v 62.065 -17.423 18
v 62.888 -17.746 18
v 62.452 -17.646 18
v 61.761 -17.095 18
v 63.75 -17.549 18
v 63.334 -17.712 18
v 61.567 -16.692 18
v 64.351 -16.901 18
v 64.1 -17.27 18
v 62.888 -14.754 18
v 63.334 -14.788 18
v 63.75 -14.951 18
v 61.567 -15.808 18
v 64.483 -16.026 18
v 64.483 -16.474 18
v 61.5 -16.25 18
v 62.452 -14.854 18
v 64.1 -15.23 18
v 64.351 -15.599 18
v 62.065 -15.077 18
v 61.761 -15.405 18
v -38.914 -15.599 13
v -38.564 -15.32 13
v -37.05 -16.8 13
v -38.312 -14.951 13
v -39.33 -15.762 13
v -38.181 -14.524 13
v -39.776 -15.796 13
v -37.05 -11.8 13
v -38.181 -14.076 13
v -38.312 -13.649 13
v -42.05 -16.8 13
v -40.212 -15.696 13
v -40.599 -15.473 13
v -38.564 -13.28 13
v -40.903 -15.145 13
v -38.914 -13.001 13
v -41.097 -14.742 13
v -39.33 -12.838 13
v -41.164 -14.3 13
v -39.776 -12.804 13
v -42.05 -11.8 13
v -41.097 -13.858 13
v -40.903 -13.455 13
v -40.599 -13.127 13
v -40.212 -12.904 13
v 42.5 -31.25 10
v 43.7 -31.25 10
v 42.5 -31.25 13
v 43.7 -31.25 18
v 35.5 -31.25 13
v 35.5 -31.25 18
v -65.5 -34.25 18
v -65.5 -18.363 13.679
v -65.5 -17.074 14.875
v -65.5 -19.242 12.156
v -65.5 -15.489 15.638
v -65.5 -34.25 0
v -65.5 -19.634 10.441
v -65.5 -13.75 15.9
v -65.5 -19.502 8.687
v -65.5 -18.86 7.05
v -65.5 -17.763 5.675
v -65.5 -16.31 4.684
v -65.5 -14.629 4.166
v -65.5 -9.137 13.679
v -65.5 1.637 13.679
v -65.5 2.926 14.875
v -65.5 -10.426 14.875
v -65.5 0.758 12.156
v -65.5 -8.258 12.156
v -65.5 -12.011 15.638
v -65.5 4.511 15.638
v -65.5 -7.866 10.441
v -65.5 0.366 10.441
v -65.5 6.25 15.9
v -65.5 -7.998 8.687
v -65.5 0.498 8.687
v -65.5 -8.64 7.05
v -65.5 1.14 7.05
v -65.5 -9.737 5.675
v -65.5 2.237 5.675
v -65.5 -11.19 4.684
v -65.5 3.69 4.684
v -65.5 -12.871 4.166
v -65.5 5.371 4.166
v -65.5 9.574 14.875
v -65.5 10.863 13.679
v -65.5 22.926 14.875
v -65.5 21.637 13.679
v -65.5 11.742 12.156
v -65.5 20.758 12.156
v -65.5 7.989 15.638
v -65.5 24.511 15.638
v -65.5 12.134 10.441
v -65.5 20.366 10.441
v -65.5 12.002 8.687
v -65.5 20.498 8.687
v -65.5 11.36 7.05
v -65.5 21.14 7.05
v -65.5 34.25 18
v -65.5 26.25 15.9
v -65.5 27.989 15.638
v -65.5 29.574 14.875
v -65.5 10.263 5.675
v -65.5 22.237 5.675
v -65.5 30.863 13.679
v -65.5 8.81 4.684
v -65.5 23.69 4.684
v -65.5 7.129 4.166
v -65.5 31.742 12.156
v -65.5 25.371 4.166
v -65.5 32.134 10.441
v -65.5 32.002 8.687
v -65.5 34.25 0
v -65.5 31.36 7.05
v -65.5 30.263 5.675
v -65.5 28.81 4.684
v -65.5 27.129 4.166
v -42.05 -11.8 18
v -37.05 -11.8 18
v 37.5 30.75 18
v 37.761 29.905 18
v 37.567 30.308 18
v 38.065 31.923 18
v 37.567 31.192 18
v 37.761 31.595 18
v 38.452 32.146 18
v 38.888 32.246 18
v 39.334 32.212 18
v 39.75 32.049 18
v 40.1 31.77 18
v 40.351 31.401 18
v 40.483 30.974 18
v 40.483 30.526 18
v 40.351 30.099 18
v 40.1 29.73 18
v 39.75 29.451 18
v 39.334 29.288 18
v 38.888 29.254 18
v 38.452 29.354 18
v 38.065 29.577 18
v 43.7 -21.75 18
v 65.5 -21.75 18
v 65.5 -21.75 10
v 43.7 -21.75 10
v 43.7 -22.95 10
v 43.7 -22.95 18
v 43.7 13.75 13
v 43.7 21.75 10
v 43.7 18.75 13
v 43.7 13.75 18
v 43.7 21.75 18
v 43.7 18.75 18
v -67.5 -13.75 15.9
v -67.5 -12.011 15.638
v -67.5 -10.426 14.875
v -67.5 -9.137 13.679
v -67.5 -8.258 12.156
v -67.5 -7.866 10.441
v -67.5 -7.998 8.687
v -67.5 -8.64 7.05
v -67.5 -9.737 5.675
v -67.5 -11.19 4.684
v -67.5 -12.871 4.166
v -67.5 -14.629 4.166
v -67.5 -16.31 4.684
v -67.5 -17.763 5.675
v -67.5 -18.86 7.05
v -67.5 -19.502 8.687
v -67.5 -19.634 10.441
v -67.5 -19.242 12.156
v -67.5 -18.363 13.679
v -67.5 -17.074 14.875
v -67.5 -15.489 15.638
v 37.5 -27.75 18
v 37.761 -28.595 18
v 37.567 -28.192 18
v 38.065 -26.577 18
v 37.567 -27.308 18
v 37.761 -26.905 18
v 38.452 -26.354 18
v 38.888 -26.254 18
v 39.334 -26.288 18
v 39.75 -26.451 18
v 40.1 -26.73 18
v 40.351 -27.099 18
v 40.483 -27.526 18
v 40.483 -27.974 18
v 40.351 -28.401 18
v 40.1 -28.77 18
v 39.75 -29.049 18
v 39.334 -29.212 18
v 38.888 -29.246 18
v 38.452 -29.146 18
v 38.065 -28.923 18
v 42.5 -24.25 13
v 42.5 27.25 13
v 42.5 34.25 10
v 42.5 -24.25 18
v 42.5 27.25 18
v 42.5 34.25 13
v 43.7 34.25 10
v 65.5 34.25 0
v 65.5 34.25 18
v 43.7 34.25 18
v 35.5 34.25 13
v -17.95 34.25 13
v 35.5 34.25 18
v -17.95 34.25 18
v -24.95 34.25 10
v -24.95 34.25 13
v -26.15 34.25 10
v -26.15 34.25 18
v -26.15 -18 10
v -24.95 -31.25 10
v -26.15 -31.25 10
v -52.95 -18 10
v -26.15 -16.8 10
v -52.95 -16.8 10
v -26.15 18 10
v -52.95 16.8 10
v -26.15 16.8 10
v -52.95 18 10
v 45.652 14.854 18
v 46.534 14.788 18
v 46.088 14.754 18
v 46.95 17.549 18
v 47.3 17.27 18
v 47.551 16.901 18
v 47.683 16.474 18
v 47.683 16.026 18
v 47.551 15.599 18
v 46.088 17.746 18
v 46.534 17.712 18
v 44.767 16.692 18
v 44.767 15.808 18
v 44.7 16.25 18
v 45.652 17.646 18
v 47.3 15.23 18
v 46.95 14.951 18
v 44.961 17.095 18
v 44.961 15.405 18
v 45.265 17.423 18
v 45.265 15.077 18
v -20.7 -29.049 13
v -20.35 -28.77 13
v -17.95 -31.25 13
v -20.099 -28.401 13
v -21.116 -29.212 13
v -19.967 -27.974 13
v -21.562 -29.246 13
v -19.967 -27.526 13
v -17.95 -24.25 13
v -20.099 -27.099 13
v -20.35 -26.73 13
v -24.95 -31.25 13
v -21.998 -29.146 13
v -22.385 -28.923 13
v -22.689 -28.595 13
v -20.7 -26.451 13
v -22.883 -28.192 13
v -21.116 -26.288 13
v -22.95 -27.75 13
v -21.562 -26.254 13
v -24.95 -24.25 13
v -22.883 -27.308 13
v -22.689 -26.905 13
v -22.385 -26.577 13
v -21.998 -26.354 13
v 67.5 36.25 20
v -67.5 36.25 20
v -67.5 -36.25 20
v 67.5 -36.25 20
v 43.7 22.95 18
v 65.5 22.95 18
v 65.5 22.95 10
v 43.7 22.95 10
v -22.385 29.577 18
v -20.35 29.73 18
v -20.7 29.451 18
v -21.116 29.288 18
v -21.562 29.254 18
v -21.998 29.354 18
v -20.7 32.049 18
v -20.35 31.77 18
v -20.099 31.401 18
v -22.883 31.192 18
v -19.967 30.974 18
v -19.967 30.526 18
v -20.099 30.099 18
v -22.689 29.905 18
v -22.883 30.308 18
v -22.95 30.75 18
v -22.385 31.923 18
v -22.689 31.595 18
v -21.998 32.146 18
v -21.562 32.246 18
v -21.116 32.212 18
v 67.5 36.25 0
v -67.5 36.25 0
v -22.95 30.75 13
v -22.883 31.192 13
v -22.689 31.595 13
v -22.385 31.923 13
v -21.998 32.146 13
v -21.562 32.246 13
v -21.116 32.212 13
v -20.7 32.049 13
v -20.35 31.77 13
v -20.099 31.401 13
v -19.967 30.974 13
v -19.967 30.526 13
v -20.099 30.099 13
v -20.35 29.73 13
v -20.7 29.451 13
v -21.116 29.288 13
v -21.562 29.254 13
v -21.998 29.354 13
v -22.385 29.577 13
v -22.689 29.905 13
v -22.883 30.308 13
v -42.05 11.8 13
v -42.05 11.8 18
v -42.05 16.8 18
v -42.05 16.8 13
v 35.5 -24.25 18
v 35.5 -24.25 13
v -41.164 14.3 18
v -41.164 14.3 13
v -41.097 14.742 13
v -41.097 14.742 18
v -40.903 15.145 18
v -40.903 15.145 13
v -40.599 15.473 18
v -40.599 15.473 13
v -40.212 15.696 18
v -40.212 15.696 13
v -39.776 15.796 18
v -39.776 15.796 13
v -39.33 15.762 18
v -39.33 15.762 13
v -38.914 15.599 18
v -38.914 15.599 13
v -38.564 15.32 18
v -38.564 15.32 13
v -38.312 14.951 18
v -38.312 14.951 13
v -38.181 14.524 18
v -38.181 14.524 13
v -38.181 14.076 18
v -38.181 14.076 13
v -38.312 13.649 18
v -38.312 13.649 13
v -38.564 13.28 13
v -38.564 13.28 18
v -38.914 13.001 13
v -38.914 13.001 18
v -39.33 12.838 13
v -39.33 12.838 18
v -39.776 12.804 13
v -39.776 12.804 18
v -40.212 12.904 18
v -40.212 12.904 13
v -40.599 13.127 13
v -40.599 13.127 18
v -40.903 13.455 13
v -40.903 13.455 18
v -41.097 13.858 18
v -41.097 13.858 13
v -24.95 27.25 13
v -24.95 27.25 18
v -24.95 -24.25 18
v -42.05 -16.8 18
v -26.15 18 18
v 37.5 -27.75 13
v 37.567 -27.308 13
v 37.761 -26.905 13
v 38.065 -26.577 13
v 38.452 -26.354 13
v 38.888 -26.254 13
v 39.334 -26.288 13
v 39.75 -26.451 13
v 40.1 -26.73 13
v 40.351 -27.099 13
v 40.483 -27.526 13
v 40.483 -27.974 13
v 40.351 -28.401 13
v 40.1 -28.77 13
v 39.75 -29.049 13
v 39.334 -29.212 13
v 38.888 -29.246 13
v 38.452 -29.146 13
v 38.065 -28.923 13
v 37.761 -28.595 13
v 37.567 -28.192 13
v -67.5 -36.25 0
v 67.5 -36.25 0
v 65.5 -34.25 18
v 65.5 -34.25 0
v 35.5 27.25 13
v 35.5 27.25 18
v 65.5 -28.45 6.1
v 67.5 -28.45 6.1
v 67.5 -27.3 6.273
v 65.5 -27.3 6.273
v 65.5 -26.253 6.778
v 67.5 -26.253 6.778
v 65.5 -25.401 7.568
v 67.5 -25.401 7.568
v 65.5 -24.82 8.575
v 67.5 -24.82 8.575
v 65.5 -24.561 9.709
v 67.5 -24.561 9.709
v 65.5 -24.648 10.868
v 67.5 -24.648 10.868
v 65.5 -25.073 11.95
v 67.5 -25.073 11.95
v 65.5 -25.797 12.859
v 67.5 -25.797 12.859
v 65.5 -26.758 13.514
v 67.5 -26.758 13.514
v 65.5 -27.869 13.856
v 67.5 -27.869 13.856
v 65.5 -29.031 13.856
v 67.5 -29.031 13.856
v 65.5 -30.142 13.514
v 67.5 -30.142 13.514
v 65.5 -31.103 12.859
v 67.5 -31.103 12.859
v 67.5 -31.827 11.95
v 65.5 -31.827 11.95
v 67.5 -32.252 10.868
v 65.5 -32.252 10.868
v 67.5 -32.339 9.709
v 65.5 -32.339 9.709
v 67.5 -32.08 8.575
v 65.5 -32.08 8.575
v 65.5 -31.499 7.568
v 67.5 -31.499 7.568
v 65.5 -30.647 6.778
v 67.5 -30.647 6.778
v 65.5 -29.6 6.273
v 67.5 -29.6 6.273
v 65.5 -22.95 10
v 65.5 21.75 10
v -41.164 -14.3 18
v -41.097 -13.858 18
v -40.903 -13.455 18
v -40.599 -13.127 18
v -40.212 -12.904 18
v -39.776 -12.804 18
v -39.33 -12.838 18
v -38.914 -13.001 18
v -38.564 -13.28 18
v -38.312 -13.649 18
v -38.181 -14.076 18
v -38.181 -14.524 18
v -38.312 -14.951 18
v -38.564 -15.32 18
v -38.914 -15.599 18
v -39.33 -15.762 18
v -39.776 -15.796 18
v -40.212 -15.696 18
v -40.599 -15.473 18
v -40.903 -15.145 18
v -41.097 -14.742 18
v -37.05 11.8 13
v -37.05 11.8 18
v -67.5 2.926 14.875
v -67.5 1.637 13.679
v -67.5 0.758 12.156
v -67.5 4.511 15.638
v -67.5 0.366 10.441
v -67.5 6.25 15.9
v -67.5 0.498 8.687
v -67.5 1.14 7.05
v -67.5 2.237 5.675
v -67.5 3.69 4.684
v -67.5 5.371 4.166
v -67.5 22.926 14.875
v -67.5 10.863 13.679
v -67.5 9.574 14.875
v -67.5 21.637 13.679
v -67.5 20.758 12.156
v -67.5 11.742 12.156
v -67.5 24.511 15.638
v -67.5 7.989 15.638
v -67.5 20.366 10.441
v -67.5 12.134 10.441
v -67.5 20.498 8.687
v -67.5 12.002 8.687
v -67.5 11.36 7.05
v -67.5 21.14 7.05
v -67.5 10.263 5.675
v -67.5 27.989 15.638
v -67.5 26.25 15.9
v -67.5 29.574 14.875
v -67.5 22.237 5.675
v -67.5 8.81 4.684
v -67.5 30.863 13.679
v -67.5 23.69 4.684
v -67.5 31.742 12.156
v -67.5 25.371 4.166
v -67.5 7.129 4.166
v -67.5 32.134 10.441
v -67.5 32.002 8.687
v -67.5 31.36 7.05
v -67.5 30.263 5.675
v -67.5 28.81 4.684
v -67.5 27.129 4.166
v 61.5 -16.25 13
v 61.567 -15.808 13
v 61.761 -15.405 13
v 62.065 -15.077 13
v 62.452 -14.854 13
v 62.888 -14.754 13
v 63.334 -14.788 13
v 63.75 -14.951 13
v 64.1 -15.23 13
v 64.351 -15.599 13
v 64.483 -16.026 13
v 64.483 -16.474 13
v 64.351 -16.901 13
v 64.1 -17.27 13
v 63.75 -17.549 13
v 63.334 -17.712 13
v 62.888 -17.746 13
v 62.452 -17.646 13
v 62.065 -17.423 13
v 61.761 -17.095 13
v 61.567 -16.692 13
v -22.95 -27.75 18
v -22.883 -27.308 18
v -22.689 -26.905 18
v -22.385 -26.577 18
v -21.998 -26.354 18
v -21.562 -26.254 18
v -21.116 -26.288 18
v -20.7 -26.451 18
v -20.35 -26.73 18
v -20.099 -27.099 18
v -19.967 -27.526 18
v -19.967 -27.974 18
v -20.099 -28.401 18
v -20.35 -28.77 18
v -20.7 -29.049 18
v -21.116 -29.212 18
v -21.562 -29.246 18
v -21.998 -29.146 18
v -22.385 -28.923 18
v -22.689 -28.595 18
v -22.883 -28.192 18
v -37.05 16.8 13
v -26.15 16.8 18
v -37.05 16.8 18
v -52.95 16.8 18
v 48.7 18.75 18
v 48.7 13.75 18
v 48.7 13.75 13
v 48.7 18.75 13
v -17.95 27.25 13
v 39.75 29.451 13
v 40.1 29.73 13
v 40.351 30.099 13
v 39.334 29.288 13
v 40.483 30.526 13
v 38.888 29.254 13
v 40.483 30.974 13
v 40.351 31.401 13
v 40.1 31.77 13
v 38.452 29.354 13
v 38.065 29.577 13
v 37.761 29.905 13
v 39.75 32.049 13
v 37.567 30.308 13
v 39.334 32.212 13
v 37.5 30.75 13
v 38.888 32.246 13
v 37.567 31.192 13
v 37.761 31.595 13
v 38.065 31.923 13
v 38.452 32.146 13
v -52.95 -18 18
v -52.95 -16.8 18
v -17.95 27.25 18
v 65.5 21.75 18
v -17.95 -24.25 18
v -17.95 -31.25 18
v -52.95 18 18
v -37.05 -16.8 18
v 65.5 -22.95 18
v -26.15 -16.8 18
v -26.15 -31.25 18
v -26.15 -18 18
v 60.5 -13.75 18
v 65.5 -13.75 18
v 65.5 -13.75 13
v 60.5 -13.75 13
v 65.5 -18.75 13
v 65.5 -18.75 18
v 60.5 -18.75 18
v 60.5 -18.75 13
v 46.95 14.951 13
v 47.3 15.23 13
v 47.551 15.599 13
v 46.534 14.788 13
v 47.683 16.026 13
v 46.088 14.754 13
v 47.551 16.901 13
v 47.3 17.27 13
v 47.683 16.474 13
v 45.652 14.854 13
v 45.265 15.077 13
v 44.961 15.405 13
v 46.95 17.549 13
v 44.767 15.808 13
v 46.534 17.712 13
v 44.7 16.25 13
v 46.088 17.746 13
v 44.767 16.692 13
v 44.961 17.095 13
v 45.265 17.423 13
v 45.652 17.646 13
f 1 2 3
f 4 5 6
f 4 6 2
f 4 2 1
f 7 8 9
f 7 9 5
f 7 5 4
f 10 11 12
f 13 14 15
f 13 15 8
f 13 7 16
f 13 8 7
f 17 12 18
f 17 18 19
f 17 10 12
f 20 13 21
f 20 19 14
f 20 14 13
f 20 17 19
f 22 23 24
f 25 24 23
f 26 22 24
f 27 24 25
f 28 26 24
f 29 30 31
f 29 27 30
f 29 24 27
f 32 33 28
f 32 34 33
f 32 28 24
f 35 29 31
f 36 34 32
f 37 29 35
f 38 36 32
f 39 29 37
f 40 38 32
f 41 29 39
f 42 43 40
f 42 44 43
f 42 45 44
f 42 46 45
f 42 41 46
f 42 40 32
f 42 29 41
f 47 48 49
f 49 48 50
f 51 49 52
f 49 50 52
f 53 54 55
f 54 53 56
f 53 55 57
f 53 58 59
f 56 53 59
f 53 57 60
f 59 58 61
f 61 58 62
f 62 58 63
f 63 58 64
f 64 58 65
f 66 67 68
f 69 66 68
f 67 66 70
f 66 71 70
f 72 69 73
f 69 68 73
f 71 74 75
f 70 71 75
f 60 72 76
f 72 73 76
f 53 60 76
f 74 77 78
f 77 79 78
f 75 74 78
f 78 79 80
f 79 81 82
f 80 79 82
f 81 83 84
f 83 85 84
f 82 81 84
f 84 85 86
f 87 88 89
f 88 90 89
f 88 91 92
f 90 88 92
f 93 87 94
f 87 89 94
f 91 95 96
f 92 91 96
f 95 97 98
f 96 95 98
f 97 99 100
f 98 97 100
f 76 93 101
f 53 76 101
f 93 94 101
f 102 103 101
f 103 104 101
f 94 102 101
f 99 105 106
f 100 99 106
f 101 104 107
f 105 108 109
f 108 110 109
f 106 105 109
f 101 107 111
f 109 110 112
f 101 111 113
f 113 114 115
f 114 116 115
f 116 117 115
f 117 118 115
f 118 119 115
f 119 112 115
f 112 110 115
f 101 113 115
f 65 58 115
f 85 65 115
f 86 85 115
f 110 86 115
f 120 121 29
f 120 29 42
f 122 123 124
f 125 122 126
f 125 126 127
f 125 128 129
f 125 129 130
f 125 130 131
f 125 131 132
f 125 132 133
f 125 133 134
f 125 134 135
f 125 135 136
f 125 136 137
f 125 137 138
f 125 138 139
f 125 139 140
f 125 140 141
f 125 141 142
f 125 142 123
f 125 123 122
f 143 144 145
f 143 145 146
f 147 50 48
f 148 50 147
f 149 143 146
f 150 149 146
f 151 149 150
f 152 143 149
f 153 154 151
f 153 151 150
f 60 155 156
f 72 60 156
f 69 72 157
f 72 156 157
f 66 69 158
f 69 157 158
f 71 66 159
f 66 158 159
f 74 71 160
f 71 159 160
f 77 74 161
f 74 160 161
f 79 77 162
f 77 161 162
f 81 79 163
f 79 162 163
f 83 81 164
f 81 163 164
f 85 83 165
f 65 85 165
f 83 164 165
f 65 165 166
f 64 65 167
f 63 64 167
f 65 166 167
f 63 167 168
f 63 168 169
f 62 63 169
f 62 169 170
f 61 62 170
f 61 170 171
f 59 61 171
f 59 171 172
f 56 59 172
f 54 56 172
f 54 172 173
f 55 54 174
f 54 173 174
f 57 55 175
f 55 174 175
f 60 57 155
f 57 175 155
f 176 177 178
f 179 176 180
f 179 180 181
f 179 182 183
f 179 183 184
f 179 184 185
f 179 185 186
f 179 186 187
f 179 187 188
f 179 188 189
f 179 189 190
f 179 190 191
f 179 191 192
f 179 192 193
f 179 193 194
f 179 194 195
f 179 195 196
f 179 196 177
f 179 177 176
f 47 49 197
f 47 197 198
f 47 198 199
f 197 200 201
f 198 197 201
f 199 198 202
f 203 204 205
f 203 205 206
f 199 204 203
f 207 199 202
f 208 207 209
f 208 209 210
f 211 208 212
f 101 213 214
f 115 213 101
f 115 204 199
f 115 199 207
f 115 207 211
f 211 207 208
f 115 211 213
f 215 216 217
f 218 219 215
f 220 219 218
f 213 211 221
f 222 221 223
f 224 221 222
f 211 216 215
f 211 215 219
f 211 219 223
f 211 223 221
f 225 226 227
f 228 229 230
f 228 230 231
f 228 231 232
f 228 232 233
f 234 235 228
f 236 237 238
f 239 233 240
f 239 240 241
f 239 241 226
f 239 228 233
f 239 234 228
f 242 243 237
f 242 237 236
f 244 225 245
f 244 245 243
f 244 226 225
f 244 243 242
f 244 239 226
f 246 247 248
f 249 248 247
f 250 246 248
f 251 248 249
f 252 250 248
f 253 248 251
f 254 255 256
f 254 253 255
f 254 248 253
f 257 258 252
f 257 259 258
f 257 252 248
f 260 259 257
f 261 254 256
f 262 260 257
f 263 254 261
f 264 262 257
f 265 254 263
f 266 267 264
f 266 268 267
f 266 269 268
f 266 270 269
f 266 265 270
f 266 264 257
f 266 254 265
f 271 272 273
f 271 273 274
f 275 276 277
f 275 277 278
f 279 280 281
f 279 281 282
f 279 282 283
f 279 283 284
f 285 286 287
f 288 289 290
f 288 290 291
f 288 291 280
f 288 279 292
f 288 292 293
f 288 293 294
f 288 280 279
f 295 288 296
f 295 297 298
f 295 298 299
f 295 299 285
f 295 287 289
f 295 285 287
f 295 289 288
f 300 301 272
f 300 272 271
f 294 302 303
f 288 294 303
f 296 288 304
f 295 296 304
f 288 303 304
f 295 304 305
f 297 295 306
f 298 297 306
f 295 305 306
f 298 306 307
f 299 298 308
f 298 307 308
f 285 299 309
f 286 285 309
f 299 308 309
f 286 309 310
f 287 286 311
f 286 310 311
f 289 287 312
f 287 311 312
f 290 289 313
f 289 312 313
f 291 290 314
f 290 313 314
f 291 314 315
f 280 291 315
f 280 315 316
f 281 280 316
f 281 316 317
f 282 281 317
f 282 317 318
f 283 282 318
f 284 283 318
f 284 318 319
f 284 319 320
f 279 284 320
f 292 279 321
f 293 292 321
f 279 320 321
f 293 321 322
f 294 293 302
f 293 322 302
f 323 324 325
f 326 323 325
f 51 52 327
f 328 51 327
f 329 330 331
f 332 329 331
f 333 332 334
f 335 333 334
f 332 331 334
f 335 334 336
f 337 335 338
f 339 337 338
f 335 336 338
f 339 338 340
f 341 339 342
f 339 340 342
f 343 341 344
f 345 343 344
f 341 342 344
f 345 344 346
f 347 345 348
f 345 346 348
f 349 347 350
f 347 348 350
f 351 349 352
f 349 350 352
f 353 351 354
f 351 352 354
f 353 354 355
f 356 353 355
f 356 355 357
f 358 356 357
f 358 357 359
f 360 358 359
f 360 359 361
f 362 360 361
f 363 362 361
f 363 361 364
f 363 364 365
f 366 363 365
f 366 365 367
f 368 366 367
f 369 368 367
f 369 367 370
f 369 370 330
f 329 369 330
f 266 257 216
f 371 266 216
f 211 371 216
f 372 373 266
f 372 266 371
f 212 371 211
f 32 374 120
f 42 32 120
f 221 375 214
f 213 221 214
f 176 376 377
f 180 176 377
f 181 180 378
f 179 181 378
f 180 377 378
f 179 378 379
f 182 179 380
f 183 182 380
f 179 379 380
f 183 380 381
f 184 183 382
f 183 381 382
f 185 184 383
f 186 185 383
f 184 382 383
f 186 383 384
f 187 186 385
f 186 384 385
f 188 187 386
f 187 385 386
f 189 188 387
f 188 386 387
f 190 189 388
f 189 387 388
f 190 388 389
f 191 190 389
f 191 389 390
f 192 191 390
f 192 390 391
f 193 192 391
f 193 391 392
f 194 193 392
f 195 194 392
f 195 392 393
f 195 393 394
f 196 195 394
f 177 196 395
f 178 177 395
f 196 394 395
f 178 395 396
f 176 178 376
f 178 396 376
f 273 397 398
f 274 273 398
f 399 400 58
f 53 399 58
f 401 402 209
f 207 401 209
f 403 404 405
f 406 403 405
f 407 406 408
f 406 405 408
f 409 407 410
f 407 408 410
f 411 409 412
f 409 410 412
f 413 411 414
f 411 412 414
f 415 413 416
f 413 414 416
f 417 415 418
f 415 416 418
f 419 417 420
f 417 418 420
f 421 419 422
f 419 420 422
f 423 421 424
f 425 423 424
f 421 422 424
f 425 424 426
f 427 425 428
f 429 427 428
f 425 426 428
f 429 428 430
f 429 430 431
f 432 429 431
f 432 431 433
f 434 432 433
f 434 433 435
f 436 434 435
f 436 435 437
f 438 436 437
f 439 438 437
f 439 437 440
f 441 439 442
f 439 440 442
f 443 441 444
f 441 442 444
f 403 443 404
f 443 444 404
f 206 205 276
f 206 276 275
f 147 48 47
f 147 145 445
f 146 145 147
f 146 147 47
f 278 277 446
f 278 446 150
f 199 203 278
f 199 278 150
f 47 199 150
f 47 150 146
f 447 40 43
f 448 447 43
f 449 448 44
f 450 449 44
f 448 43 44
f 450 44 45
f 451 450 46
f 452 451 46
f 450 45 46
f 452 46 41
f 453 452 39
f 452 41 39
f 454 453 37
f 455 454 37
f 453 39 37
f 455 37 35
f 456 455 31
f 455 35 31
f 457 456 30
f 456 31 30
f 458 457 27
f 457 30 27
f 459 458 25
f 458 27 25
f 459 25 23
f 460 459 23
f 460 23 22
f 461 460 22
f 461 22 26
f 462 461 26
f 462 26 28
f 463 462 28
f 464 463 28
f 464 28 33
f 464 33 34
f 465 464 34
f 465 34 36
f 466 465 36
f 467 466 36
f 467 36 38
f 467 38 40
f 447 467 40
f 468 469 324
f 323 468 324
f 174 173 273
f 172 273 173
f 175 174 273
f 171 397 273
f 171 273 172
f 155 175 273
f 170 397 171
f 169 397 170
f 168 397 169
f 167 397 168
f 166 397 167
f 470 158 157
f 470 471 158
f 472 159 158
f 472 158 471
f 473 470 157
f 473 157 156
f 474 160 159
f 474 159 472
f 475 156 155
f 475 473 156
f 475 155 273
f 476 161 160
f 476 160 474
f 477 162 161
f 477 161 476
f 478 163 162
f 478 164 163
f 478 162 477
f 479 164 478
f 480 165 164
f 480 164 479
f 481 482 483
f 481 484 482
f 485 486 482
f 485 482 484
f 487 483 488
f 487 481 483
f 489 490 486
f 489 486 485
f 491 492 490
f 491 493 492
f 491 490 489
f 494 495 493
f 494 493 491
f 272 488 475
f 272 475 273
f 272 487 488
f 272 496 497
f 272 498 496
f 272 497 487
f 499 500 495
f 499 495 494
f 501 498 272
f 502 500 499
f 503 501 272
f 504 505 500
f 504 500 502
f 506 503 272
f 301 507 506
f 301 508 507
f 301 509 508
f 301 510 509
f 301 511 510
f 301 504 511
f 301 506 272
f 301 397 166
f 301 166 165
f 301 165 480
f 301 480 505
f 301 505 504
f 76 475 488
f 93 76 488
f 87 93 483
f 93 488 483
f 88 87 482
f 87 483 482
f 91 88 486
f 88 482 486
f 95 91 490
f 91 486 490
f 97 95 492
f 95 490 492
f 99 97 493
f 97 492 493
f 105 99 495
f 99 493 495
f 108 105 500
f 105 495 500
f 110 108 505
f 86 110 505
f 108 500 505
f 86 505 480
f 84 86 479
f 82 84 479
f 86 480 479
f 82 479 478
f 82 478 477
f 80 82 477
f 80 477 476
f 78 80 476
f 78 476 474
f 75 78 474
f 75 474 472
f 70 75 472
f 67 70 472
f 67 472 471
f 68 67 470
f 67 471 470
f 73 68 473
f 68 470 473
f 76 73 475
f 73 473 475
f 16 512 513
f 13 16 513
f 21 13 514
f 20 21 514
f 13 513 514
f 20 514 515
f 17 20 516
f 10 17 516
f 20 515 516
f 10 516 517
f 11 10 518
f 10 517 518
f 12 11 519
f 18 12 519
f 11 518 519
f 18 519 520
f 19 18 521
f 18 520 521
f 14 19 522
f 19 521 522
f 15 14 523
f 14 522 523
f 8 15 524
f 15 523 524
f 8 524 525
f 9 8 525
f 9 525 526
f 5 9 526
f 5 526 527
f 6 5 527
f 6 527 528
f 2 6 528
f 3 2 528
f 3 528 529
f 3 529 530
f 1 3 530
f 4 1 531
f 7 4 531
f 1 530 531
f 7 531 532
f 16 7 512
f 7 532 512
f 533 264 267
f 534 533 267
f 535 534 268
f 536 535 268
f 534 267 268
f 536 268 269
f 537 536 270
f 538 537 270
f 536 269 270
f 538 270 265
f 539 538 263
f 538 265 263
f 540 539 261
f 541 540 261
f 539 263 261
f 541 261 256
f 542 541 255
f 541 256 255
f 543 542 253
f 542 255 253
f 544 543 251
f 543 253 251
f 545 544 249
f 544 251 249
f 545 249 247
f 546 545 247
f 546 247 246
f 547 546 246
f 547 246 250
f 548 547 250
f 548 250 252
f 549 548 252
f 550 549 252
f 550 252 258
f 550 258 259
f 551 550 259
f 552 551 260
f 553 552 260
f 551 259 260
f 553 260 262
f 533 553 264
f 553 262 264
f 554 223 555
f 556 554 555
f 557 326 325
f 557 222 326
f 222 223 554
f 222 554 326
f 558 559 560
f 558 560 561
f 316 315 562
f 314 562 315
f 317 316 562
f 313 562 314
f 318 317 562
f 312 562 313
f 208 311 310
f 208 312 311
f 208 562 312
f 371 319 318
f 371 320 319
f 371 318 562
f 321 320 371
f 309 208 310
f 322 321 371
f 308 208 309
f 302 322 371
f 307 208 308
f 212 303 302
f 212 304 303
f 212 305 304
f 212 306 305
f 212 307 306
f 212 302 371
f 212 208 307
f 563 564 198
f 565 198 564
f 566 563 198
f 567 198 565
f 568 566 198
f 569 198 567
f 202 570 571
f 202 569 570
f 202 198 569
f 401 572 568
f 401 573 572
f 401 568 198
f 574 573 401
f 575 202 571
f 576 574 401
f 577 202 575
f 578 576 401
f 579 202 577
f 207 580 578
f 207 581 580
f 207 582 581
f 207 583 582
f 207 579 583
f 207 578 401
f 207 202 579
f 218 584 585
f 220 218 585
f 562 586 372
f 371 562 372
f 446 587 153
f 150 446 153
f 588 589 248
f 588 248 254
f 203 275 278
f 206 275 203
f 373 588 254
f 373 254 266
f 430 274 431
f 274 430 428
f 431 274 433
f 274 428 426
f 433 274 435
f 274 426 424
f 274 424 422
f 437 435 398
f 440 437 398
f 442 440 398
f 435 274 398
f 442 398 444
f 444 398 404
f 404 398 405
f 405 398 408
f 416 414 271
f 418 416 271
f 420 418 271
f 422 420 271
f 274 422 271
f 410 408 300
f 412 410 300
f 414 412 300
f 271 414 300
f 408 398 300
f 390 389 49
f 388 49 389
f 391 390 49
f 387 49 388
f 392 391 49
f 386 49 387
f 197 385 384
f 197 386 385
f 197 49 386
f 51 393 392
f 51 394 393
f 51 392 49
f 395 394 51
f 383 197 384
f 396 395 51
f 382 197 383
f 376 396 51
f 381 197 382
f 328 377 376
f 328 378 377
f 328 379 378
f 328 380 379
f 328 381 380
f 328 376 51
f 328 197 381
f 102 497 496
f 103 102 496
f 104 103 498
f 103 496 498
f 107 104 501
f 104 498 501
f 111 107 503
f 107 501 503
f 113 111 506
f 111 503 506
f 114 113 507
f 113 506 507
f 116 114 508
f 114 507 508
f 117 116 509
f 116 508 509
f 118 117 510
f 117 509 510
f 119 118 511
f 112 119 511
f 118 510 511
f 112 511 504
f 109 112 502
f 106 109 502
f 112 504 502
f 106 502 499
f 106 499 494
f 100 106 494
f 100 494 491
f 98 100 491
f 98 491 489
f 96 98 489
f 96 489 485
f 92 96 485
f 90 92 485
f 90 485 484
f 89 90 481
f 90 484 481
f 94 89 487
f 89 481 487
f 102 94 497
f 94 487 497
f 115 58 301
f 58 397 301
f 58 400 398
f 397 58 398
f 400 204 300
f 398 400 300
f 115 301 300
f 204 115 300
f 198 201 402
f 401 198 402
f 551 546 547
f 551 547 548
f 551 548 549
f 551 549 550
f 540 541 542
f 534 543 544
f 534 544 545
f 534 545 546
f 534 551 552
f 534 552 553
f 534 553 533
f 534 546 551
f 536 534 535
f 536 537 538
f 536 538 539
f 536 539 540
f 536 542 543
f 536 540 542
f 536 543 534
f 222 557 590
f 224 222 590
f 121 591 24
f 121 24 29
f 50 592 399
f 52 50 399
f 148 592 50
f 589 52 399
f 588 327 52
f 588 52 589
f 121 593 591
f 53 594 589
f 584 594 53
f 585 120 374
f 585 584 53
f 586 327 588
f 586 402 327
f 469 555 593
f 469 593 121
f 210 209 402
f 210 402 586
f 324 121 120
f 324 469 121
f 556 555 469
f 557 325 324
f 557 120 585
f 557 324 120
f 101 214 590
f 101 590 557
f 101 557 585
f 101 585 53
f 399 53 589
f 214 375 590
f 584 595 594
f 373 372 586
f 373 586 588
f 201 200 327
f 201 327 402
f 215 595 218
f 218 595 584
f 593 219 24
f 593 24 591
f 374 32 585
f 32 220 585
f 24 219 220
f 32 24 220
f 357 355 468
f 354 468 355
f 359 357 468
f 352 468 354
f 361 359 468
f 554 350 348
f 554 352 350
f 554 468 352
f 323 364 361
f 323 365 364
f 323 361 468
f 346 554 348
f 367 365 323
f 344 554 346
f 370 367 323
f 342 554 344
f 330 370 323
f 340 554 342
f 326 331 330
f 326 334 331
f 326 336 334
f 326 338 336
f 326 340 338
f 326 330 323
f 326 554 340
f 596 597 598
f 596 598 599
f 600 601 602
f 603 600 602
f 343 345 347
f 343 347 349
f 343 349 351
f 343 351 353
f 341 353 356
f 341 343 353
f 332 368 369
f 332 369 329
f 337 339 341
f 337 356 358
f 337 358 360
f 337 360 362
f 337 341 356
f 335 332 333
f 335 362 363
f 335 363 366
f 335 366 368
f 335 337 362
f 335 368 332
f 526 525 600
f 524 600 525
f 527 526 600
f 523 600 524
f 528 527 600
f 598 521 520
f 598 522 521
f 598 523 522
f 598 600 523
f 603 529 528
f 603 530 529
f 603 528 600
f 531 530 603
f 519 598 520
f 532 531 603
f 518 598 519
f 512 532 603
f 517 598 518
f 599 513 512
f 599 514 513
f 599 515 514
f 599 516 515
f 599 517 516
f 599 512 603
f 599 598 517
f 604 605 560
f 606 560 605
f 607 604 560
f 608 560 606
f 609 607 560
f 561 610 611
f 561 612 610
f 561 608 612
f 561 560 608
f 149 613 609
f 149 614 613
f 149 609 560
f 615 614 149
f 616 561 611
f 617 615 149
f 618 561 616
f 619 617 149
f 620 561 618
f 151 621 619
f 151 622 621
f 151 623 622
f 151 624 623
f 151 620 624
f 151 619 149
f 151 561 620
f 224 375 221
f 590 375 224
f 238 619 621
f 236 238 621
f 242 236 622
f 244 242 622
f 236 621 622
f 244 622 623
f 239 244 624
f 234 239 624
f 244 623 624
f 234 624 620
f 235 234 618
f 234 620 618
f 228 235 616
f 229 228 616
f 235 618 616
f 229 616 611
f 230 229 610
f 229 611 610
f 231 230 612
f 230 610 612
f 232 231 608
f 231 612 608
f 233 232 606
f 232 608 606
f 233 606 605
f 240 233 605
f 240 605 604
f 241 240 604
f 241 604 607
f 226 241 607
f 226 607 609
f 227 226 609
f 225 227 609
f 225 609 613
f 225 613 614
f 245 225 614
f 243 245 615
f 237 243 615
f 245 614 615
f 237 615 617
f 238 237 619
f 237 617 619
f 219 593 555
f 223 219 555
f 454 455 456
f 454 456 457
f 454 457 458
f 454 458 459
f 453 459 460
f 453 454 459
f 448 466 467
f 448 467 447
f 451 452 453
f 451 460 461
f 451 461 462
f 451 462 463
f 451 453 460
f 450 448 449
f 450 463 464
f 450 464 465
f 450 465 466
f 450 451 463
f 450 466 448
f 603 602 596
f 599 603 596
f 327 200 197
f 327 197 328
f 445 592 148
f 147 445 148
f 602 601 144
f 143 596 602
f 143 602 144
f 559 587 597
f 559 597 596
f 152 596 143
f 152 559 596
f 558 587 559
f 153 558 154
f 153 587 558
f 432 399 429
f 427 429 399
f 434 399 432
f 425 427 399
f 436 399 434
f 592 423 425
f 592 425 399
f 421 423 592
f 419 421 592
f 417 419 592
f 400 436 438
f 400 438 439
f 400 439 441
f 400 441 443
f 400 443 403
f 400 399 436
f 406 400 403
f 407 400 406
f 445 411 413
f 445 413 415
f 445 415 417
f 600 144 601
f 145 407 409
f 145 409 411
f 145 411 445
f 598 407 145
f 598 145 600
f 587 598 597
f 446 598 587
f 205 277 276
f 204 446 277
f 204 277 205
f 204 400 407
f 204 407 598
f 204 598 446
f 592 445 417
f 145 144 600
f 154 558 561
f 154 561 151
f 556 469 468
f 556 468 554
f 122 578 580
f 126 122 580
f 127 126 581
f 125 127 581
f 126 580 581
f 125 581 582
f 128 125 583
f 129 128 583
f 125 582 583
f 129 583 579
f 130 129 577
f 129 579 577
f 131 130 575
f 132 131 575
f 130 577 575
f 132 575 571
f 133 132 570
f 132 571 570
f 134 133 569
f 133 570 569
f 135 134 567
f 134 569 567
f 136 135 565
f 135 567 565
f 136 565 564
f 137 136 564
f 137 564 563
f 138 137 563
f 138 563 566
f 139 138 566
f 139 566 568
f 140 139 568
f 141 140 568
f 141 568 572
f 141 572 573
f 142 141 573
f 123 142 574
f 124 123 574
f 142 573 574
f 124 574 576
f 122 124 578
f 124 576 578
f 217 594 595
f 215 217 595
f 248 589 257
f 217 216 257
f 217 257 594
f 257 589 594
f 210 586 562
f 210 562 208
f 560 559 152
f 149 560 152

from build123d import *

# Parameters (mm, degrees)
SKETCH3_W            = 135
SKETCH3_H            = 72.5
BOSS_EXTRUDE1_DEPTH  = 20
SKETCH4_W            = 131
SKETCH4_H            = 68.5
CUT_EXTRUDE1_DEPTH   = 18
SKETCH6_W            = 23
SKETCH6_H            = 45.9
BOSS_EXTRUDE2_DEPTH  = 8
SKETCH5_W            = 21.8
SKETCH5_H            = 43.5
CUT_EXTRUDE2_DEPTH   = 18
SKETCH7_W            = 1.2
SKETCH7_H            = 8.3
SKETCH7_H_2          = 11.3
BOSS_EXTRUDE5_DEPTH  = 8
SKETCH9_W            = 1.2
SKETCH9_H            = 65.5
BOSS_EXTRUDE6_DEPTH  = 8
SKETCH11_W           = 26.8
SKETCH11_H           = 36
BOSS_EXTRUDE7_DEPTH  = 8
SKETCH10_W           = 25.6
SKETCH10_H           = 33.6
CUT_EXTRUDE3_DEPTH   = 8
SKETCH13_W           = 8
SKETCH13_H           = 33.6
CUT_EXTRUDE4_DEPTH   = 1.2
SKETCH14_R           = 3.9
CUT_EXTRUDE5_DEPTH   = 2
SKETCH15_R           = 5.9
CUT_EXTRUDE6_DEPTH   = 2
SKETCH18_W           = 5
SKETCH18_H           = 5
BOSS_EXTRUDE8_DEPTH  = 5
SKETCH19_R           = 1.5
CUT_EXTRUDE7_DEPTH   = 8
SKETCH20_W           = 5
SKETCH20_H           = 5
BOSS_EXTRUDE9_DEPTH  = 5
SKETCH21_R           = 1.5
CUT_EXTRUDE8_DEPTH   = 5
SKETCH23_W           = 7
SKETCH23_H           = 7
BOSS_EXTRUDE10_DEPTH = 5
SKETCH24_R           = 1.5
CUT_EXTRUDE10_DEPTH  = 5


with BuildPart() as part:
    # Sketch3 → Boss-Extrude1 (new body)
    with BuildSketch(Plane.XY):
        Rectangle(SKETCH3_W, SKETCH3_H)
    extrude(amount=BOSS_EXTRUDE1_DEPTH)

    # Sketch4 → Cut-Extrude1 (cut)
    with BuildSketch(Plane(origin=(0, 0, 0), x_dir=(-1, 0, 0), z_dir=(0, 0, -1))):
        Rectangle(SKETCH4_W, SKETCH4_H)
    extrude(amount=-CUT_EXTRUDE1_DEPTH, mode=Mode.SUBTRACT)

    # Sketch6 → Boss-Extrude2 (add)
    with BuildSketch(Plane(origin=(0, 0, 18), x_dir=(-1, 0, 0), z_dir=(0, 0, -1))):
        with Locations((-54, 0)):
            Rectangle(SKETCH6_W, SKETCH6_H)
    extrude(amount=BOSS_EXTRUDE2_DEPTH)

    # Sketch5 → Cut-Extrude2 (cut)
    with BuildSketch(Plane(origin=(0, 0, 18), x_dir=(-1, 0, 0), z_dir=(0, 0, -1))):
        with Locations((-54.6, 0)):
            Rectangle(SKETCH5_W, SKETCH5_H)
    extrude(amount=CUT_EXTRUDE2_DEPTH, mode=Mode.SUBTRACT)

    # Sketch7 → Boss-Extrude5 (add)
    with BuildSketch(Plane(origin=(0, 0, 18), x_dir=(-1, 0, 0), z_dir=(0, 0, -1))):
        with Locations((-43.1, -27.1)):
            Rectangle(SKETCH7_W, SKETCH7_H)
        with Locations((-43.1, 28.6)):
            Rectangle(SKETCH7_W, SKETCH7_H_2)
    extrude(amount=BOSS_EXTRUDE5_DEPTH)

    # Sketch9 → Boss-Extrude6 (add)
    with BuildSketch(Plane(origin=(0, 0, 18), x_dir=(-1, 0, 0), z_dir=(0, 0, -1))):
        with Locations((25.55, 1.5)):
            Rectangle(SKETCH9_W, SKETCH9_H)
    extrude(amount=BOSS_EXTRUDE6_DEPTH)

    # Sketch11 → Boss-Extrude7 (add)
    with BuildSketch(Plane(origin=(0, 0, 18), x_dir=(-1, 0, 0), z_dir=(0, 0, -1))):
        with Locations((39.55, 0)):
            Rectangle(SKETCH11_W, SKETCH11_H)
    extrude(amount=BOSS_EXTRUDE7_DEPTH)

    # Sketch10 → Cut-Extrude3 (cut)
    with BuildSketch(Plane(origin=(0, 0, 18), x_dir=(-1, 0, 0), z_dir=(0, 0, -1))):
        with Locations((38.95, 0)):
            Rectangle(SKETCH10_W, SKETCH10_H)
    extrude(amount=CUT_EXTRUDE3_DEPTH, mode=Mode.SUBTRACT)

    # Sketch13 → Cut-Extrude4 (cut)
    with BuildSketch(Plane.ZY.offset(52.95)):
        with Locations((14, 0)):
            Rectangle(SKETCH13_W, SKETCH13_H)
    extrude(amount=-CUT_EXTRUDE4_DEPTH, mode=Mode.SUBTRACT)

    # Sketch14 → Cut-Extrude5 (cut)
    with BuildSketch(Plane(origin=(67.5, 0, 0), x_dir=(0, 0, -1), z_dir=(1, 0, 0))):
        with Locations((-10, -28.45)):
            Circle(SKETCH14_R)
    extrude(amount=-CUT_EXTRUDE5_DEPTH, mode=Mode.SUBTRACT)

    # Sketch15 → Cut-Extrude6 (cut)
    with BuildSketch(Plane.ZY.offset(67.5)):
        with Locations((10, 26.25)):
            Circle(SKETCH15_R)
        with Locations((10, 6.25)):
            Circle(SKETCH15_R)
        with Locations((10, -13.75)):
            Circle(SKETCH15_R)
    extrude(amount=-CUT_EXTRUDE6_DEPTH, mode=Mode.SUBTRACT)

    # Sketch18 → Boss-Extrude8 (add)
    with BuildSketch(Plane(origin=(0, 0, 18), x_dir=(-1, 0, 0), z_dir=(0, 0, -1))):
        with Locations((39.55, -14.3)):
            Rectangle(SKETCH18_W, SKETCH18_H)
        with Locations((39.55, 14.3)):
            Rectangle(SKETCH18_W, SKETCH18_H)
    extrude(amount=BOSS_EXTRUDE8_DEPTH)

    # Sketch19 → Cut-Extrude7 (cut)
    with BuildSketch(Plane(origin=(0, 0, 10), x_dir=(-1, 0, 0), z_dir=(0, 0, -1))):
        with Locations((39.663798911, -14.3)):
            Circle(SKETCH19_R)
        with Locations((39.663798911, 14.3)):
            Circle(SKETCH19_R)
    extrude(amount=-CUT_EXTRUDE7_DEPTH, mode=Mode.SUBTRACT)

    # Sketch20 → Boss-Extrude9 (add)
    with BuildSketch(Plane(origin=(0, 0, 18), x_dir=(-1, 0, 0), z_dir=(0, 0, -1))):
        with Locations((-46.2, 16.25)):
            Rectangle(SKETCH20_W, SKETCH20_H)
        with Locations((-63, -16.25)):
            Rectangle(SKETCH20_W, SKETCH20_H)
    extrude(amount=BOSS_EXTRUDE9_DEPTH)

    # Sketch21 → Cut-Extrude8 (cut)
    with BuildSketch(Plane(origin=(0, 0, 13), x_dir=(-1, 0, 0), z_dir=(0, 0, -1))):
        with Locations((-46.2, 16.25)):
            Circle(SKETCH21_R)
        with Locations((-63, -16.25)):
            Circle(SKETCH21_R)
    extrude(amount=-CUT_EXTRUDE8_DEPTH, mode=Mode.SUBTRACT)

    # Sketch23 → Boss-Extrude10 (add)
    with BuildSketch(Plane(origin=(0, 0, 18), x_dir=(-1, 0, 0), z_dir=(0, 0, -1))):
        with Locations((-39, 30.75)):
            Rectangle(SKETCH23_W, SKETCH23_H)
        with Locations((21.45, 30.75)):
            Rectangle(SKETCH23_W, SKETCH23_H)
        with Locations((21.45, -27.75)):
            Rectangle(SKETCH23_W, SKETCH23_H)
        with Locations((-39, -27.75)):
            Rectangle(SKETCH23_W, SKETCH23_H)
    extrude(amount=BOSS_EXTRUDE10_DEPTH)

    # Sketch24 → Cut-Extrude10 (cut)
    with BuildSketch(Plane(origin=(0, 0, 13), x_dir=(-1, 0, 0), z_dir=(0, 0, -1))):
        with Locations((-39, 30.75)):
            Circle(SKETCH24_R)
        with Locations((21.45, 30.75)):
            Circle(SKETCH24_R)
        with Locations((21.45, -27.75)):
            Circle(SKETCH24_R)
        with Locations((-39, -27.75)):
            Circle(SKETCH24_R)
    extrude(amount=-CUT_EXTRUDE10_DEPTH, mode=Mode.SUBTRACT)


solid = part.part
